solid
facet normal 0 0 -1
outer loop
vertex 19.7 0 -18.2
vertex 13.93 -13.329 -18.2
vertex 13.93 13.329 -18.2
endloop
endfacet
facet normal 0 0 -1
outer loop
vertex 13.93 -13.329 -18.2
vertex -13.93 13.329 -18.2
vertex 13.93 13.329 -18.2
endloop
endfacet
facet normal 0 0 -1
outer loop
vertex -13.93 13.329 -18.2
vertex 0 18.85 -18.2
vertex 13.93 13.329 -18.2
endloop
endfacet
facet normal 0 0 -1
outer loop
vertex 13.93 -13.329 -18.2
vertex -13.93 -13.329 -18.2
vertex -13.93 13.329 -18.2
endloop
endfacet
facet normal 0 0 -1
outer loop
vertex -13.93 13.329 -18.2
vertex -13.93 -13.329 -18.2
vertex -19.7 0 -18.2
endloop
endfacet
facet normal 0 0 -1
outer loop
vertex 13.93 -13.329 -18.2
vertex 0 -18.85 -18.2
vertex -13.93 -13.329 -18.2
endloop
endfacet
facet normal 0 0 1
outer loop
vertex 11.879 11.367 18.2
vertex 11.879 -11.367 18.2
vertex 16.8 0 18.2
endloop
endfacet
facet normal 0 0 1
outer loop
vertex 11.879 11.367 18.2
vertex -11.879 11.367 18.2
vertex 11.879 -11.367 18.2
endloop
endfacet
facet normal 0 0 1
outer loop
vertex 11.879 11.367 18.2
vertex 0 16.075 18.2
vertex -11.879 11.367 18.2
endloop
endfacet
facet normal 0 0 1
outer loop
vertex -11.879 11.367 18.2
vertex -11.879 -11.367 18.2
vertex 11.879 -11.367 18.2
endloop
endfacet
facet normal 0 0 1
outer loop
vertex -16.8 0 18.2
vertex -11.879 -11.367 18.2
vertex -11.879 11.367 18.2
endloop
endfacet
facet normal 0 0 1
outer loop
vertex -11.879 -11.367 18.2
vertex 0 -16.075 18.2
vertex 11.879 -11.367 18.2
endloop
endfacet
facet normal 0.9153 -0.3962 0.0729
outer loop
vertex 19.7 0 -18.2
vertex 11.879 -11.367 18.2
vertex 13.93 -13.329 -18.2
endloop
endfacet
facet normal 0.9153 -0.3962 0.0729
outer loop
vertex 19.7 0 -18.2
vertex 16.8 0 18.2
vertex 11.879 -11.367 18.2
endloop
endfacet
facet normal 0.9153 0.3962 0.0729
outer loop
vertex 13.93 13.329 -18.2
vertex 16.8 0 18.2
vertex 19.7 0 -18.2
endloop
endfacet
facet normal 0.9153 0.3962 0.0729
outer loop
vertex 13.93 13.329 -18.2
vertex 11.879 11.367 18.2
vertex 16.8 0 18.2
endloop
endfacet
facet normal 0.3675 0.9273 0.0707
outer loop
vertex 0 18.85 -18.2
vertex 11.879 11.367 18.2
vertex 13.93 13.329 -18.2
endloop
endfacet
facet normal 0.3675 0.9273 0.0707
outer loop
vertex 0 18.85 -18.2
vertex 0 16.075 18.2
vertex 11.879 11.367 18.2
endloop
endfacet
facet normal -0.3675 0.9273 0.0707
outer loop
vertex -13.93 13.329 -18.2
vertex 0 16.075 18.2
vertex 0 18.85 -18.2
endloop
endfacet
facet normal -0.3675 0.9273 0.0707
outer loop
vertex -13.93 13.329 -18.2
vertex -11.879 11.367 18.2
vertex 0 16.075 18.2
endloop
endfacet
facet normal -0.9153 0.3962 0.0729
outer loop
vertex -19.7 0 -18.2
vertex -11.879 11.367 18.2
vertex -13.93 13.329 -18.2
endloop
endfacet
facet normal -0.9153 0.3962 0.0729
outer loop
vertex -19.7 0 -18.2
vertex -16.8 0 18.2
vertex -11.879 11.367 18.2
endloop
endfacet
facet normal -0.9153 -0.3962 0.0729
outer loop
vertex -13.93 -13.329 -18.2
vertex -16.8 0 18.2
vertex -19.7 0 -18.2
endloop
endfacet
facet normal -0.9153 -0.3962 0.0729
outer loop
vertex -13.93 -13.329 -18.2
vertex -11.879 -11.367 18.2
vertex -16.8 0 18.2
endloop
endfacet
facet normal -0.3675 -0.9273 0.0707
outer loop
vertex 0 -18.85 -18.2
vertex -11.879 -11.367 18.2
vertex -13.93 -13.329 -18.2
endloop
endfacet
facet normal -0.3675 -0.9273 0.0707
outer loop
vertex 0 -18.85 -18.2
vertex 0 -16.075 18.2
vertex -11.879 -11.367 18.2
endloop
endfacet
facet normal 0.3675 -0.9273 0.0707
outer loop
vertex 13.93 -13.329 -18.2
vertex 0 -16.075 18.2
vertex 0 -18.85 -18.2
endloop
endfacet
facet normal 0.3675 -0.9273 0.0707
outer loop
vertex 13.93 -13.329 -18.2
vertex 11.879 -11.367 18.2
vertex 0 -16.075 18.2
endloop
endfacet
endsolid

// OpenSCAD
$fn=64;

module frustum_poly(top_r=19.7, bot_r=16.8, h=36.4, n=8){
    linear_extrude(height=h, scale=bot_r/top_r, center=true, convexity=10)
        polygon(points=[for(i=[0:n-1]) [top_r*cos(360*i/n), top_r*sin(360*i/n)]]);
}

module truncated_prism_faceted(){
    // Scale to exact bounding box: 39.4 x 37.7 x 36.4
    // Base shape is symmetric; apply non-uniform XY scaling to match X/Y bounds.
    scale([1, 37.7/39.4, 1])
        frustum_poly(top_r=19.7, bot_r=16.8, h=36.4, n=8);
}

truncated_prism_faceted();
